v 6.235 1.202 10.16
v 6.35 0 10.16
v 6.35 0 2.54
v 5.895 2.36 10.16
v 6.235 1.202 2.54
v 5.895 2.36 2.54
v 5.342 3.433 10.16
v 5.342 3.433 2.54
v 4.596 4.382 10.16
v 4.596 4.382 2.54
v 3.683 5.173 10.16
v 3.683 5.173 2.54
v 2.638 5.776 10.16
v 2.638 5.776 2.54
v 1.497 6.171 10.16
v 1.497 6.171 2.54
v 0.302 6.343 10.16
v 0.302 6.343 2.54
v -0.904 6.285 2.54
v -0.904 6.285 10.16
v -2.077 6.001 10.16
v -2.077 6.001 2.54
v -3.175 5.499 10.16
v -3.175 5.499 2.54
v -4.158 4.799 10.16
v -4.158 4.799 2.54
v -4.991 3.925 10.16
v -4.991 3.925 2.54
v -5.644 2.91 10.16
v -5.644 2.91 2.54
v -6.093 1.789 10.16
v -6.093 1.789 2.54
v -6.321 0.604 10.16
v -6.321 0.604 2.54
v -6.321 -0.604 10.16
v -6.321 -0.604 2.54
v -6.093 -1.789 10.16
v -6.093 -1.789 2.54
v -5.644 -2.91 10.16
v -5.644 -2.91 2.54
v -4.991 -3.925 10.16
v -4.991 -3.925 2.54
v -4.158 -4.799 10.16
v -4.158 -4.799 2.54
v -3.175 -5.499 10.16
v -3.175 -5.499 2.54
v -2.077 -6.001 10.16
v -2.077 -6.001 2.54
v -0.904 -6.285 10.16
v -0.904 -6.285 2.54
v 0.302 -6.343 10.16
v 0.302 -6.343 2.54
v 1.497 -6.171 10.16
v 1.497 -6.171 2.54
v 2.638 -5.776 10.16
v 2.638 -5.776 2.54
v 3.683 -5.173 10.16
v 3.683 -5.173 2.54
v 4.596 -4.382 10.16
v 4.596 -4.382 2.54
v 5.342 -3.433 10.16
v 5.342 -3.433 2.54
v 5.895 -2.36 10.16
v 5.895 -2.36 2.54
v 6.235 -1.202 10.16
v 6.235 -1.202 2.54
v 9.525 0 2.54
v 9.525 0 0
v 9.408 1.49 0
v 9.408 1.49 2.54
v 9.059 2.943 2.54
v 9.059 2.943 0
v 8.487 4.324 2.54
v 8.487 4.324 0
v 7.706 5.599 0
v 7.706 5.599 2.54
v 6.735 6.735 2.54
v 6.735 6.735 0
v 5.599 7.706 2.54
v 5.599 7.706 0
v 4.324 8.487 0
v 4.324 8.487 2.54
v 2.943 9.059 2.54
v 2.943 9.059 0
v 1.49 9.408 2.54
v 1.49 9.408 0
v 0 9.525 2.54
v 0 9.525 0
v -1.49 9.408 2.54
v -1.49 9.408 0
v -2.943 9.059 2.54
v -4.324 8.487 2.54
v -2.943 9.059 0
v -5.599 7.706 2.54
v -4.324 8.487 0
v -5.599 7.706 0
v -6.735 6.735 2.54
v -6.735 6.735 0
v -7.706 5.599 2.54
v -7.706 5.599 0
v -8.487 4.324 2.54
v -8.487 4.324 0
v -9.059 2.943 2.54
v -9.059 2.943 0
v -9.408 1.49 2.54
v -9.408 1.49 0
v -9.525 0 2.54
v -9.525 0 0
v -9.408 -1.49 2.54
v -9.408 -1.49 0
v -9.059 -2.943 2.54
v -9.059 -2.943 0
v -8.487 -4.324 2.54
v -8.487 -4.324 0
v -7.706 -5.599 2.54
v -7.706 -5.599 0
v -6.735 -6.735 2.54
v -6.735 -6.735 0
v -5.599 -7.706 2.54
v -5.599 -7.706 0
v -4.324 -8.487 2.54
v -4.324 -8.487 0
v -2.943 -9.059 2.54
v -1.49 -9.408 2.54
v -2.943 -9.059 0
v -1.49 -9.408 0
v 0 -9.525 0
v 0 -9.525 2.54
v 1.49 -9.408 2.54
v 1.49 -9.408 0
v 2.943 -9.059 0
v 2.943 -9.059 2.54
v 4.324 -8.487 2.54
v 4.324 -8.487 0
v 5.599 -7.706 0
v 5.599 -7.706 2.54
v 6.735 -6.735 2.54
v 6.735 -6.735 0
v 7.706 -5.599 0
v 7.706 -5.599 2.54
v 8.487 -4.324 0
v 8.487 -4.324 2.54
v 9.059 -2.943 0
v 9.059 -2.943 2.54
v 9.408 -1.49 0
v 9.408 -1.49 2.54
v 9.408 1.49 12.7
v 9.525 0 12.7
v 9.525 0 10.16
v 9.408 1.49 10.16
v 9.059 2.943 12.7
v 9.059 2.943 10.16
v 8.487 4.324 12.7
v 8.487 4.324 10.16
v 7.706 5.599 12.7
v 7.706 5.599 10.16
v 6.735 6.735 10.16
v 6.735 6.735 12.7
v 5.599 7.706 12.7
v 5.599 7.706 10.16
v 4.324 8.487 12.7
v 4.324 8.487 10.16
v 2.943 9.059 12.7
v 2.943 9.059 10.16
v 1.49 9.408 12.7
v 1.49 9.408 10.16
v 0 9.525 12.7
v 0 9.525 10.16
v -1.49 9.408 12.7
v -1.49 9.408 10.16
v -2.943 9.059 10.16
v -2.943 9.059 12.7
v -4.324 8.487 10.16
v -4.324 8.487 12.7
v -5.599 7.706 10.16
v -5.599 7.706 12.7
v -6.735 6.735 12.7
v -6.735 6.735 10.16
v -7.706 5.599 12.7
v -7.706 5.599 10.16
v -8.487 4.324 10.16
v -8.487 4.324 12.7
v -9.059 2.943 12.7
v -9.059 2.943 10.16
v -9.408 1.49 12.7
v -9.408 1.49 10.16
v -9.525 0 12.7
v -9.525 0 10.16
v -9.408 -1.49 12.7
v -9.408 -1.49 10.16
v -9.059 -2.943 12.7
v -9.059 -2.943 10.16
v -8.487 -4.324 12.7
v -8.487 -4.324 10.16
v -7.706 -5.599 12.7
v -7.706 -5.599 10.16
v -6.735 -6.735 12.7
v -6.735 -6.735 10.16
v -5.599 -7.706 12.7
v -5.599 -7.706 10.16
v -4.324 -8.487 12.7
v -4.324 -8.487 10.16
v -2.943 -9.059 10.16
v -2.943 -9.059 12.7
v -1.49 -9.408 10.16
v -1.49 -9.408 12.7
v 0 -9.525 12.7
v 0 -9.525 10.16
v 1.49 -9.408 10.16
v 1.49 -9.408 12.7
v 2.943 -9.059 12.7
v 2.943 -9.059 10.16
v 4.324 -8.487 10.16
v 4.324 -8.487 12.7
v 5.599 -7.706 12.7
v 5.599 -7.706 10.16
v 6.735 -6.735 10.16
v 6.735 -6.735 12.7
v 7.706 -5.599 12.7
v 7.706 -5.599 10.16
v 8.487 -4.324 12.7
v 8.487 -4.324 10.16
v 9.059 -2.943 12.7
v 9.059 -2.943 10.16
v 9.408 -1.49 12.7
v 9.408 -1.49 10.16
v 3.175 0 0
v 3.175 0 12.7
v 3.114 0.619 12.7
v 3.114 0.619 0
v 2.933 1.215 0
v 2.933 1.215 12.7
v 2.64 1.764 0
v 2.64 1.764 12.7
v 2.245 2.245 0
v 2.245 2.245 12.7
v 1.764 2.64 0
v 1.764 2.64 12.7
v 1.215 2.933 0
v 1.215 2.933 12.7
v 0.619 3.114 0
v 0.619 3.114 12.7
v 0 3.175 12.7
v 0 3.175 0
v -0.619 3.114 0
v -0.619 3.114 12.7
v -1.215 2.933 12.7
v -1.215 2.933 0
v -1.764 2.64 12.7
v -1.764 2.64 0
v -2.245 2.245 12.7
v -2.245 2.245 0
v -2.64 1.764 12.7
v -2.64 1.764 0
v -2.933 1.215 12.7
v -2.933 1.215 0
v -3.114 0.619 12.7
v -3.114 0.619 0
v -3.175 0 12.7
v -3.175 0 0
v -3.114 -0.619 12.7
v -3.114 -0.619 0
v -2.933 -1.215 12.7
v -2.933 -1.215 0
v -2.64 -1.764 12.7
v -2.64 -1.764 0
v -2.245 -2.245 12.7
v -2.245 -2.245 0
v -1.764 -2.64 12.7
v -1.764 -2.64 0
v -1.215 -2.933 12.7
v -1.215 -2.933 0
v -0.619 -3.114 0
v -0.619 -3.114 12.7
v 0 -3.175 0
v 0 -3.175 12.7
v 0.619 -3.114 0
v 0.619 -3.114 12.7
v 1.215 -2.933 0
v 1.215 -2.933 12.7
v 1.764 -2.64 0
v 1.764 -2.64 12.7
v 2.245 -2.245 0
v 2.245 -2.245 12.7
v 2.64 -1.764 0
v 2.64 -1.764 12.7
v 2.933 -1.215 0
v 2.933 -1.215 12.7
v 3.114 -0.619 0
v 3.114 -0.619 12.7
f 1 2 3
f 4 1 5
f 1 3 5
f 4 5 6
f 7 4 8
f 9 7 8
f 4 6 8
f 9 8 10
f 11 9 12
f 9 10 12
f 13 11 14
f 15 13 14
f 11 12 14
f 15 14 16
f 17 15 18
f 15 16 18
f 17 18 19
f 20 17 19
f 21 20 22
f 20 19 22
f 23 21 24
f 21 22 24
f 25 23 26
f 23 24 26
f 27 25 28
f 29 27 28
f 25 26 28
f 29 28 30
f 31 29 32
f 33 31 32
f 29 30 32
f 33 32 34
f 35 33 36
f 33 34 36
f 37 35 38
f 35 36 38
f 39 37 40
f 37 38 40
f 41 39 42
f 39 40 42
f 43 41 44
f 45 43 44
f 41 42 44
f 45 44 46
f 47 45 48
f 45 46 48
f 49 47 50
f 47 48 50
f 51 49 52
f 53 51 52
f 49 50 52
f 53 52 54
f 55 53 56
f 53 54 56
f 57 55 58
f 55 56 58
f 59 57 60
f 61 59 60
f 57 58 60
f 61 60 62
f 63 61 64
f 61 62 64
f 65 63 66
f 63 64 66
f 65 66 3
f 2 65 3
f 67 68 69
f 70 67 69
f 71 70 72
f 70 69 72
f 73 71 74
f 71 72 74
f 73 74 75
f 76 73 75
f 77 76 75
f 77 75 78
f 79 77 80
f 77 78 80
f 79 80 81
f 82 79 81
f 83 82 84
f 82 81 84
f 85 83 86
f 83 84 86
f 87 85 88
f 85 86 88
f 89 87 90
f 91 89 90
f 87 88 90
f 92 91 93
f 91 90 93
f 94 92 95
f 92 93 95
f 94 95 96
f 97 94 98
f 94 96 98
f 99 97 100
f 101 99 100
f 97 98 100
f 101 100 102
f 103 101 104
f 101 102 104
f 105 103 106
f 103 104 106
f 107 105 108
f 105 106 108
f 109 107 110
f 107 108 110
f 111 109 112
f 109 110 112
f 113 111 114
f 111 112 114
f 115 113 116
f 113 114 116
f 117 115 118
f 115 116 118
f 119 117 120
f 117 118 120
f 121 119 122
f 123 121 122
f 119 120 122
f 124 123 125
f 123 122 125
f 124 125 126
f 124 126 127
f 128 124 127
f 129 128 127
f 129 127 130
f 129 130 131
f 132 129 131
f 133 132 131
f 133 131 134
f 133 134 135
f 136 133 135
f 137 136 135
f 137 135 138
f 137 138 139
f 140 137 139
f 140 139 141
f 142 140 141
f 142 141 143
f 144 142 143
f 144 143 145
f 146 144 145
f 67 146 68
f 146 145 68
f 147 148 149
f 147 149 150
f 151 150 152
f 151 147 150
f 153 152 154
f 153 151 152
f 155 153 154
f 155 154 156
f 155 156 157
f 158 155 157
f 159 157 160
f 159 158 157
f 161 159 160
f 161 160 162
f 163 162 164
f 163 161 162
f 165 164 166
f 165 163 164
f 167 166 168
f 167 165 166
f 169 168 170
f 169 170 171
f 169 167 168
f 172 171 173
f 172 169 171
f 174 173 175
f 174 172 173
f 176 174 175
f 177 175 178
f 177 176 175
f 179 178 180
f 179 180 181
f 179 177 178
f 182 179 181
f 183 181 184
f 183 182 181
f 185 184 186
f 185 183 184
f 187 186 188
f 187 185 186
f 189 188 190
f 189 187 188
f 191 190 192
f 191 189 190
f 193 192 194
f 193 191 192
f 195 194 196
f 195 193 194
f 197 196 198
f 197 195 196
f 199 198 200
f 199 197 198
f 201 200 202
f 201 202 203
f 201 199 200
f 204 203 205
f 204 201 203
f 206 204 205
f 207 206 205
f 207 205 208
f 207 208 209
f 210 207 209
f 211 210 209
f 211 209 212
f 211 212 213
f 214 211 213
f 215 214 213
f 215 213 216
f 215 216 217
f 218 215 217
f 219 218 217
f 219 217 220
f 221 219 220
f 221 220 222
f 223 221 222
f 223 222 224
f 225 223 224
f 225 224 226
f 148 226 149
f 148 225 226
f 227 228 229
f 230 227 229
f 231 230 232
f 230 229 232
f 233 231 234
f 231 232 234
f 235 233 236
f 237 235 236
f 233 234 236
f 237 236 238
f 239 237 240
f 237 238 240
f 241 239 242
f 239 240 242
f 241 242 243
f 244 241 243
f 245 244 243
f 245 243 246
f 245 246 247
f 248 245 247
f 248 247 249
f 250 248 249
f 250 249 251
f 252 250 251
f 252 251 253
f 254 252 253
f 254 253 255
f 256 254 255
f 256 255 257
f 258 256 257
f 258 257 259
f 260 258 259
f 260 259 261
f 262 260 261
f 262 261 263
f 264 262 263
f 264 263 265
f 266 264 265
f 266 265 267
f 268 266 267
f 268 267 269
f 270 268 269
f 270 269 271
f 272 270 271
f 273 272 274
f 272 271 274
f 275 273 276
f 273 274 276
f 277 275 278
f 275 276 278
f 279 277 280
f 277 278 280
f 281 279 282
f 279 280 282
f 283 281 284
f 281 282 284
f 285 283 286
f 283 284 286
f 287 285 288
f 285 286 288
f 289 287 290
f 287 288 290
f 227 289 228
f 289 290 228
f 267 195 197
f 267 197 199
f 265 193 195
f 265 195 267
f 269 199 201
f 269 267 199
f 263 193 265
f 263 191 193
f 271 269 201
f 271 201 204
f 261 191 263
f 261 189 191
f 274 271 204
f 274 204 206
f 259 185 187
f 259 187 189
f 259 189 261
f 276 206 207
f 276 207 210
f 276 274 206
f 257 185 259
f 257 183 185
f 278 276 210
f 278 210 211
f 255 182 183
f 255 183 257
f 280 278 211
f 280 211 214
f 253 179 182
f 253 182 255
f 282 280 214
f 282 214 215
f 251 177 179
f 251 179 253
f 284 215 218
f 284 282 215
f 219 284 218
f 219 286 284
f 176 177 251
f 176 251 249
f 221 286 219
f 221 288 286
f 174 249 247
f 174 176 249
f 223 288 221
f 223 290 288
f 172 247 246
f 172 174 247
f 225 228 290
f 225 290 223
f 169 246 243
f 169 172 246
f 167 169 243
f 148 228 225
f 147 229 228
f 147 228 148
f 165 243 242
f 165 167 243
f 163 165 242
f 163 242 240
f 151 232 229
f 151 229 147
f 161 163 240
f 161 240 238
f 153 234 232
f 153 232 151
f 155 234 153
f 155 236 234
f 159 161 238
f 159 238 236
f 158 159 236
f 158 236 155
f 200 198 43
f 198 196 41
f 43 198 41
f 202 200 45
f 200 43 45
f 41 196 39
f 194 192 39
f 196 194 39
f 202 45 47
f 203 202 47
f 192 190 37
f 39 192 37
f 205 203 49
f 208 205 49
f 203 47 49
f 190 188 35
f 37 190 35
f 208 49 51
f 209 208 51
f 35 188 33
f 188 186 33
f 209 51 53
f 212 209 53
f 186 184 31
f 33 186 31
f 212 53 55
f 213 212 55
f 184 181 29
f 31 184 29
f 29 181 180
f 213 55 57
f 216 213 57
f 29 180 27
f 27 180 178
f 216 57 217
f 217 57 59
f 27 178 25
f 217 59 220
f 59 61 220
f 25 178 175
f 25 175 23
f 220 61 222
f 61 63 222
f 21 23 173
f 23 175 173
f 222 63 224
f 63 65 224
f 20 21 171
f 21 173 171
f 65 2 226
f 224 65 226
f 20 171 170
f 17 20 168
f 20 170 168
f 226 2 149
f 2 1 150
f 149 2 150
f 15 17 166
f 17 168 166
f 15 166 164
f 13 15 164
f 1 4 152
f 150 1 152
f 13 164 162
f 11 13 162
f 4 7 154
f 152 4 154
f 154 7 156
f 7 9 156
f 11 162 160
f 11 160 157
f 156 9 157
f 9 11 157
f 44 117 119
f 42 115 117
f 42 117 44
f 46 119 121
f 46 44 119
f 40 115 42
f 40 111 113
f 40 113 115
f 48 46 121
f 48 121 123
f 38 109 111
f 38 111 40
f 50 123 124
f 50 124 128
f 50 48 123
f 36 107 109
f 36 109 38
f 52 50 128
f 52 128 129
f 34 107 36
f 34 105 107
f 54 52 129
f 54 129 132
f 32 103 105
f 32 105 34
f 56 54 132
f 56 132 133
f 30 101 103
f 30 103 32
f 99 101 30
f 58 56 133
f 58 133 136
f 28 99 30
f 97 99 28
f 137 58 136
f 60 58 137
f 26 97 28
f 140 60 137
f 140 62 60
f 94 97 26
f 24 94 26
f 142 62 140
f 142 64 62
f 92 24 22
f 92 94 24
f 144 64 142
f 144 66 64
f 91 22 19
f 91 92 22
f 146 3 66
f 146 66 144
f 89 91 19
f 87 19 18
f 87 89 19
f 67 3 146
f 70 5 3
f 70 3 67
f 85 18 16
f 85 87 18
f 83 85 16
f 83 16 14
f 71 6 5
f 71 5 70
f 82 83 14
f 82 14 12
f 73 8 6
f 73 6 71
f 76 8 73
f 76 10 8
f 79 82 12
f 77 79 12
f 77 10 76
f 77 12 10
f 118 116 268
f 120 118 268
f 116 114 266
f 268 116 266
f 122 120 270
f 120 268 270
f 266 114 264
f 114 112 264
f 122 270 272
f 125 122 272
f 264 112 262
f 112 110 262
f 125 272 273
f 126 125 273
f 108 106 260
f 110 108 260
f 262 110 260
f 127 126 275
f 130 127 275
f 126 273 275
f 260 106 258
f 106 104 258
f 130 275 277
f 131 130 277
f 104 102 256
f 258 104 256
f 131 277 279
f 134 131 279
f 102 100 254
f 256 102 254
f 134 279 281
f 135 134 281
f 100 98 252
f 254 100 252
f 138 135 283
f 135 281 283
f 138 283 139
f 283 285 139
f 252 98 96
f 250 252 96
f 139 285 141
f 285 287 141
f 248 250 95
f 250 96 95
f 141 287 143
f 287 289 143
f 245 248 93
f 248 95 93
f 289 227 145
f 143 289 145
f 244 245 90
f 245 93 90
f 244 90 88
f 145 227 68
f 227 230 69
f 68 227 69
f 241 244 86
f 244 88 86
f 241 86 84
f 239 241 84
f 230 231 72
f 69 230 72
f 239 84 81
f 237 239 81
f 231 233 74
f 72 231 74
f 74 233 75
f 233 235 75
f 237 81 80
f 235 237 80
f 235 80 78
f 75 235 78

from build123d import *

# Parameters (mm, degrees)
SKETCH1_R           = 9.525
BOSS_EXTRUDE1_DEPTH = 2.54
SKETCH2_R           = 6.35
BOSS_EXTRUDE2_DEPTH = 7.62
CUT_EXTRUDE1_REACH  = 14.7
SKETCH4_R           = 3.175


with BuildPart() as part:
    # Sketch1 → Boss-Extrude1 (new body)
    with BuildSketch(Plane.XY):
        Circle(SKETCH1_R)
    boss_extrude1 = extrude(amount=BOSS_EXTRUDE1_DEPTH)

    # Sketch2 → Boss-Extrude2 (add)
    with BuildSketch(Plane.XY.offset(2.54)):
        Circle(SKETCH2_R)
    extrude(amount=BOSS_EXTRUDE2_DEPTH)

    # Mirror1: Boss-Extrude1 across plane
    add(boss_extrude1.mirror(Plane.XY.offset(6.35)))

    # Sketch4 → Cut-Extrude1 (cut, up to next)
    with BuildSketch(Plane.XY.offset(12.7), mode=Mode.PRIVATE) as cut_extrude1_sk1:
        Circle(SKETCH4_R)
    cut_extrude1_tool1 = extrude(cut_extrude1_sk1.sketch, amount=-CUT_EXTRUDE1_REACH, mode=Mode.PRIVATE) & part.part
    add(cut_extrude1_tool1.solids().sort_by_distance((0, 0, 12.7))[0], mode=Mode.SUBTRACT)


solid = part.part
